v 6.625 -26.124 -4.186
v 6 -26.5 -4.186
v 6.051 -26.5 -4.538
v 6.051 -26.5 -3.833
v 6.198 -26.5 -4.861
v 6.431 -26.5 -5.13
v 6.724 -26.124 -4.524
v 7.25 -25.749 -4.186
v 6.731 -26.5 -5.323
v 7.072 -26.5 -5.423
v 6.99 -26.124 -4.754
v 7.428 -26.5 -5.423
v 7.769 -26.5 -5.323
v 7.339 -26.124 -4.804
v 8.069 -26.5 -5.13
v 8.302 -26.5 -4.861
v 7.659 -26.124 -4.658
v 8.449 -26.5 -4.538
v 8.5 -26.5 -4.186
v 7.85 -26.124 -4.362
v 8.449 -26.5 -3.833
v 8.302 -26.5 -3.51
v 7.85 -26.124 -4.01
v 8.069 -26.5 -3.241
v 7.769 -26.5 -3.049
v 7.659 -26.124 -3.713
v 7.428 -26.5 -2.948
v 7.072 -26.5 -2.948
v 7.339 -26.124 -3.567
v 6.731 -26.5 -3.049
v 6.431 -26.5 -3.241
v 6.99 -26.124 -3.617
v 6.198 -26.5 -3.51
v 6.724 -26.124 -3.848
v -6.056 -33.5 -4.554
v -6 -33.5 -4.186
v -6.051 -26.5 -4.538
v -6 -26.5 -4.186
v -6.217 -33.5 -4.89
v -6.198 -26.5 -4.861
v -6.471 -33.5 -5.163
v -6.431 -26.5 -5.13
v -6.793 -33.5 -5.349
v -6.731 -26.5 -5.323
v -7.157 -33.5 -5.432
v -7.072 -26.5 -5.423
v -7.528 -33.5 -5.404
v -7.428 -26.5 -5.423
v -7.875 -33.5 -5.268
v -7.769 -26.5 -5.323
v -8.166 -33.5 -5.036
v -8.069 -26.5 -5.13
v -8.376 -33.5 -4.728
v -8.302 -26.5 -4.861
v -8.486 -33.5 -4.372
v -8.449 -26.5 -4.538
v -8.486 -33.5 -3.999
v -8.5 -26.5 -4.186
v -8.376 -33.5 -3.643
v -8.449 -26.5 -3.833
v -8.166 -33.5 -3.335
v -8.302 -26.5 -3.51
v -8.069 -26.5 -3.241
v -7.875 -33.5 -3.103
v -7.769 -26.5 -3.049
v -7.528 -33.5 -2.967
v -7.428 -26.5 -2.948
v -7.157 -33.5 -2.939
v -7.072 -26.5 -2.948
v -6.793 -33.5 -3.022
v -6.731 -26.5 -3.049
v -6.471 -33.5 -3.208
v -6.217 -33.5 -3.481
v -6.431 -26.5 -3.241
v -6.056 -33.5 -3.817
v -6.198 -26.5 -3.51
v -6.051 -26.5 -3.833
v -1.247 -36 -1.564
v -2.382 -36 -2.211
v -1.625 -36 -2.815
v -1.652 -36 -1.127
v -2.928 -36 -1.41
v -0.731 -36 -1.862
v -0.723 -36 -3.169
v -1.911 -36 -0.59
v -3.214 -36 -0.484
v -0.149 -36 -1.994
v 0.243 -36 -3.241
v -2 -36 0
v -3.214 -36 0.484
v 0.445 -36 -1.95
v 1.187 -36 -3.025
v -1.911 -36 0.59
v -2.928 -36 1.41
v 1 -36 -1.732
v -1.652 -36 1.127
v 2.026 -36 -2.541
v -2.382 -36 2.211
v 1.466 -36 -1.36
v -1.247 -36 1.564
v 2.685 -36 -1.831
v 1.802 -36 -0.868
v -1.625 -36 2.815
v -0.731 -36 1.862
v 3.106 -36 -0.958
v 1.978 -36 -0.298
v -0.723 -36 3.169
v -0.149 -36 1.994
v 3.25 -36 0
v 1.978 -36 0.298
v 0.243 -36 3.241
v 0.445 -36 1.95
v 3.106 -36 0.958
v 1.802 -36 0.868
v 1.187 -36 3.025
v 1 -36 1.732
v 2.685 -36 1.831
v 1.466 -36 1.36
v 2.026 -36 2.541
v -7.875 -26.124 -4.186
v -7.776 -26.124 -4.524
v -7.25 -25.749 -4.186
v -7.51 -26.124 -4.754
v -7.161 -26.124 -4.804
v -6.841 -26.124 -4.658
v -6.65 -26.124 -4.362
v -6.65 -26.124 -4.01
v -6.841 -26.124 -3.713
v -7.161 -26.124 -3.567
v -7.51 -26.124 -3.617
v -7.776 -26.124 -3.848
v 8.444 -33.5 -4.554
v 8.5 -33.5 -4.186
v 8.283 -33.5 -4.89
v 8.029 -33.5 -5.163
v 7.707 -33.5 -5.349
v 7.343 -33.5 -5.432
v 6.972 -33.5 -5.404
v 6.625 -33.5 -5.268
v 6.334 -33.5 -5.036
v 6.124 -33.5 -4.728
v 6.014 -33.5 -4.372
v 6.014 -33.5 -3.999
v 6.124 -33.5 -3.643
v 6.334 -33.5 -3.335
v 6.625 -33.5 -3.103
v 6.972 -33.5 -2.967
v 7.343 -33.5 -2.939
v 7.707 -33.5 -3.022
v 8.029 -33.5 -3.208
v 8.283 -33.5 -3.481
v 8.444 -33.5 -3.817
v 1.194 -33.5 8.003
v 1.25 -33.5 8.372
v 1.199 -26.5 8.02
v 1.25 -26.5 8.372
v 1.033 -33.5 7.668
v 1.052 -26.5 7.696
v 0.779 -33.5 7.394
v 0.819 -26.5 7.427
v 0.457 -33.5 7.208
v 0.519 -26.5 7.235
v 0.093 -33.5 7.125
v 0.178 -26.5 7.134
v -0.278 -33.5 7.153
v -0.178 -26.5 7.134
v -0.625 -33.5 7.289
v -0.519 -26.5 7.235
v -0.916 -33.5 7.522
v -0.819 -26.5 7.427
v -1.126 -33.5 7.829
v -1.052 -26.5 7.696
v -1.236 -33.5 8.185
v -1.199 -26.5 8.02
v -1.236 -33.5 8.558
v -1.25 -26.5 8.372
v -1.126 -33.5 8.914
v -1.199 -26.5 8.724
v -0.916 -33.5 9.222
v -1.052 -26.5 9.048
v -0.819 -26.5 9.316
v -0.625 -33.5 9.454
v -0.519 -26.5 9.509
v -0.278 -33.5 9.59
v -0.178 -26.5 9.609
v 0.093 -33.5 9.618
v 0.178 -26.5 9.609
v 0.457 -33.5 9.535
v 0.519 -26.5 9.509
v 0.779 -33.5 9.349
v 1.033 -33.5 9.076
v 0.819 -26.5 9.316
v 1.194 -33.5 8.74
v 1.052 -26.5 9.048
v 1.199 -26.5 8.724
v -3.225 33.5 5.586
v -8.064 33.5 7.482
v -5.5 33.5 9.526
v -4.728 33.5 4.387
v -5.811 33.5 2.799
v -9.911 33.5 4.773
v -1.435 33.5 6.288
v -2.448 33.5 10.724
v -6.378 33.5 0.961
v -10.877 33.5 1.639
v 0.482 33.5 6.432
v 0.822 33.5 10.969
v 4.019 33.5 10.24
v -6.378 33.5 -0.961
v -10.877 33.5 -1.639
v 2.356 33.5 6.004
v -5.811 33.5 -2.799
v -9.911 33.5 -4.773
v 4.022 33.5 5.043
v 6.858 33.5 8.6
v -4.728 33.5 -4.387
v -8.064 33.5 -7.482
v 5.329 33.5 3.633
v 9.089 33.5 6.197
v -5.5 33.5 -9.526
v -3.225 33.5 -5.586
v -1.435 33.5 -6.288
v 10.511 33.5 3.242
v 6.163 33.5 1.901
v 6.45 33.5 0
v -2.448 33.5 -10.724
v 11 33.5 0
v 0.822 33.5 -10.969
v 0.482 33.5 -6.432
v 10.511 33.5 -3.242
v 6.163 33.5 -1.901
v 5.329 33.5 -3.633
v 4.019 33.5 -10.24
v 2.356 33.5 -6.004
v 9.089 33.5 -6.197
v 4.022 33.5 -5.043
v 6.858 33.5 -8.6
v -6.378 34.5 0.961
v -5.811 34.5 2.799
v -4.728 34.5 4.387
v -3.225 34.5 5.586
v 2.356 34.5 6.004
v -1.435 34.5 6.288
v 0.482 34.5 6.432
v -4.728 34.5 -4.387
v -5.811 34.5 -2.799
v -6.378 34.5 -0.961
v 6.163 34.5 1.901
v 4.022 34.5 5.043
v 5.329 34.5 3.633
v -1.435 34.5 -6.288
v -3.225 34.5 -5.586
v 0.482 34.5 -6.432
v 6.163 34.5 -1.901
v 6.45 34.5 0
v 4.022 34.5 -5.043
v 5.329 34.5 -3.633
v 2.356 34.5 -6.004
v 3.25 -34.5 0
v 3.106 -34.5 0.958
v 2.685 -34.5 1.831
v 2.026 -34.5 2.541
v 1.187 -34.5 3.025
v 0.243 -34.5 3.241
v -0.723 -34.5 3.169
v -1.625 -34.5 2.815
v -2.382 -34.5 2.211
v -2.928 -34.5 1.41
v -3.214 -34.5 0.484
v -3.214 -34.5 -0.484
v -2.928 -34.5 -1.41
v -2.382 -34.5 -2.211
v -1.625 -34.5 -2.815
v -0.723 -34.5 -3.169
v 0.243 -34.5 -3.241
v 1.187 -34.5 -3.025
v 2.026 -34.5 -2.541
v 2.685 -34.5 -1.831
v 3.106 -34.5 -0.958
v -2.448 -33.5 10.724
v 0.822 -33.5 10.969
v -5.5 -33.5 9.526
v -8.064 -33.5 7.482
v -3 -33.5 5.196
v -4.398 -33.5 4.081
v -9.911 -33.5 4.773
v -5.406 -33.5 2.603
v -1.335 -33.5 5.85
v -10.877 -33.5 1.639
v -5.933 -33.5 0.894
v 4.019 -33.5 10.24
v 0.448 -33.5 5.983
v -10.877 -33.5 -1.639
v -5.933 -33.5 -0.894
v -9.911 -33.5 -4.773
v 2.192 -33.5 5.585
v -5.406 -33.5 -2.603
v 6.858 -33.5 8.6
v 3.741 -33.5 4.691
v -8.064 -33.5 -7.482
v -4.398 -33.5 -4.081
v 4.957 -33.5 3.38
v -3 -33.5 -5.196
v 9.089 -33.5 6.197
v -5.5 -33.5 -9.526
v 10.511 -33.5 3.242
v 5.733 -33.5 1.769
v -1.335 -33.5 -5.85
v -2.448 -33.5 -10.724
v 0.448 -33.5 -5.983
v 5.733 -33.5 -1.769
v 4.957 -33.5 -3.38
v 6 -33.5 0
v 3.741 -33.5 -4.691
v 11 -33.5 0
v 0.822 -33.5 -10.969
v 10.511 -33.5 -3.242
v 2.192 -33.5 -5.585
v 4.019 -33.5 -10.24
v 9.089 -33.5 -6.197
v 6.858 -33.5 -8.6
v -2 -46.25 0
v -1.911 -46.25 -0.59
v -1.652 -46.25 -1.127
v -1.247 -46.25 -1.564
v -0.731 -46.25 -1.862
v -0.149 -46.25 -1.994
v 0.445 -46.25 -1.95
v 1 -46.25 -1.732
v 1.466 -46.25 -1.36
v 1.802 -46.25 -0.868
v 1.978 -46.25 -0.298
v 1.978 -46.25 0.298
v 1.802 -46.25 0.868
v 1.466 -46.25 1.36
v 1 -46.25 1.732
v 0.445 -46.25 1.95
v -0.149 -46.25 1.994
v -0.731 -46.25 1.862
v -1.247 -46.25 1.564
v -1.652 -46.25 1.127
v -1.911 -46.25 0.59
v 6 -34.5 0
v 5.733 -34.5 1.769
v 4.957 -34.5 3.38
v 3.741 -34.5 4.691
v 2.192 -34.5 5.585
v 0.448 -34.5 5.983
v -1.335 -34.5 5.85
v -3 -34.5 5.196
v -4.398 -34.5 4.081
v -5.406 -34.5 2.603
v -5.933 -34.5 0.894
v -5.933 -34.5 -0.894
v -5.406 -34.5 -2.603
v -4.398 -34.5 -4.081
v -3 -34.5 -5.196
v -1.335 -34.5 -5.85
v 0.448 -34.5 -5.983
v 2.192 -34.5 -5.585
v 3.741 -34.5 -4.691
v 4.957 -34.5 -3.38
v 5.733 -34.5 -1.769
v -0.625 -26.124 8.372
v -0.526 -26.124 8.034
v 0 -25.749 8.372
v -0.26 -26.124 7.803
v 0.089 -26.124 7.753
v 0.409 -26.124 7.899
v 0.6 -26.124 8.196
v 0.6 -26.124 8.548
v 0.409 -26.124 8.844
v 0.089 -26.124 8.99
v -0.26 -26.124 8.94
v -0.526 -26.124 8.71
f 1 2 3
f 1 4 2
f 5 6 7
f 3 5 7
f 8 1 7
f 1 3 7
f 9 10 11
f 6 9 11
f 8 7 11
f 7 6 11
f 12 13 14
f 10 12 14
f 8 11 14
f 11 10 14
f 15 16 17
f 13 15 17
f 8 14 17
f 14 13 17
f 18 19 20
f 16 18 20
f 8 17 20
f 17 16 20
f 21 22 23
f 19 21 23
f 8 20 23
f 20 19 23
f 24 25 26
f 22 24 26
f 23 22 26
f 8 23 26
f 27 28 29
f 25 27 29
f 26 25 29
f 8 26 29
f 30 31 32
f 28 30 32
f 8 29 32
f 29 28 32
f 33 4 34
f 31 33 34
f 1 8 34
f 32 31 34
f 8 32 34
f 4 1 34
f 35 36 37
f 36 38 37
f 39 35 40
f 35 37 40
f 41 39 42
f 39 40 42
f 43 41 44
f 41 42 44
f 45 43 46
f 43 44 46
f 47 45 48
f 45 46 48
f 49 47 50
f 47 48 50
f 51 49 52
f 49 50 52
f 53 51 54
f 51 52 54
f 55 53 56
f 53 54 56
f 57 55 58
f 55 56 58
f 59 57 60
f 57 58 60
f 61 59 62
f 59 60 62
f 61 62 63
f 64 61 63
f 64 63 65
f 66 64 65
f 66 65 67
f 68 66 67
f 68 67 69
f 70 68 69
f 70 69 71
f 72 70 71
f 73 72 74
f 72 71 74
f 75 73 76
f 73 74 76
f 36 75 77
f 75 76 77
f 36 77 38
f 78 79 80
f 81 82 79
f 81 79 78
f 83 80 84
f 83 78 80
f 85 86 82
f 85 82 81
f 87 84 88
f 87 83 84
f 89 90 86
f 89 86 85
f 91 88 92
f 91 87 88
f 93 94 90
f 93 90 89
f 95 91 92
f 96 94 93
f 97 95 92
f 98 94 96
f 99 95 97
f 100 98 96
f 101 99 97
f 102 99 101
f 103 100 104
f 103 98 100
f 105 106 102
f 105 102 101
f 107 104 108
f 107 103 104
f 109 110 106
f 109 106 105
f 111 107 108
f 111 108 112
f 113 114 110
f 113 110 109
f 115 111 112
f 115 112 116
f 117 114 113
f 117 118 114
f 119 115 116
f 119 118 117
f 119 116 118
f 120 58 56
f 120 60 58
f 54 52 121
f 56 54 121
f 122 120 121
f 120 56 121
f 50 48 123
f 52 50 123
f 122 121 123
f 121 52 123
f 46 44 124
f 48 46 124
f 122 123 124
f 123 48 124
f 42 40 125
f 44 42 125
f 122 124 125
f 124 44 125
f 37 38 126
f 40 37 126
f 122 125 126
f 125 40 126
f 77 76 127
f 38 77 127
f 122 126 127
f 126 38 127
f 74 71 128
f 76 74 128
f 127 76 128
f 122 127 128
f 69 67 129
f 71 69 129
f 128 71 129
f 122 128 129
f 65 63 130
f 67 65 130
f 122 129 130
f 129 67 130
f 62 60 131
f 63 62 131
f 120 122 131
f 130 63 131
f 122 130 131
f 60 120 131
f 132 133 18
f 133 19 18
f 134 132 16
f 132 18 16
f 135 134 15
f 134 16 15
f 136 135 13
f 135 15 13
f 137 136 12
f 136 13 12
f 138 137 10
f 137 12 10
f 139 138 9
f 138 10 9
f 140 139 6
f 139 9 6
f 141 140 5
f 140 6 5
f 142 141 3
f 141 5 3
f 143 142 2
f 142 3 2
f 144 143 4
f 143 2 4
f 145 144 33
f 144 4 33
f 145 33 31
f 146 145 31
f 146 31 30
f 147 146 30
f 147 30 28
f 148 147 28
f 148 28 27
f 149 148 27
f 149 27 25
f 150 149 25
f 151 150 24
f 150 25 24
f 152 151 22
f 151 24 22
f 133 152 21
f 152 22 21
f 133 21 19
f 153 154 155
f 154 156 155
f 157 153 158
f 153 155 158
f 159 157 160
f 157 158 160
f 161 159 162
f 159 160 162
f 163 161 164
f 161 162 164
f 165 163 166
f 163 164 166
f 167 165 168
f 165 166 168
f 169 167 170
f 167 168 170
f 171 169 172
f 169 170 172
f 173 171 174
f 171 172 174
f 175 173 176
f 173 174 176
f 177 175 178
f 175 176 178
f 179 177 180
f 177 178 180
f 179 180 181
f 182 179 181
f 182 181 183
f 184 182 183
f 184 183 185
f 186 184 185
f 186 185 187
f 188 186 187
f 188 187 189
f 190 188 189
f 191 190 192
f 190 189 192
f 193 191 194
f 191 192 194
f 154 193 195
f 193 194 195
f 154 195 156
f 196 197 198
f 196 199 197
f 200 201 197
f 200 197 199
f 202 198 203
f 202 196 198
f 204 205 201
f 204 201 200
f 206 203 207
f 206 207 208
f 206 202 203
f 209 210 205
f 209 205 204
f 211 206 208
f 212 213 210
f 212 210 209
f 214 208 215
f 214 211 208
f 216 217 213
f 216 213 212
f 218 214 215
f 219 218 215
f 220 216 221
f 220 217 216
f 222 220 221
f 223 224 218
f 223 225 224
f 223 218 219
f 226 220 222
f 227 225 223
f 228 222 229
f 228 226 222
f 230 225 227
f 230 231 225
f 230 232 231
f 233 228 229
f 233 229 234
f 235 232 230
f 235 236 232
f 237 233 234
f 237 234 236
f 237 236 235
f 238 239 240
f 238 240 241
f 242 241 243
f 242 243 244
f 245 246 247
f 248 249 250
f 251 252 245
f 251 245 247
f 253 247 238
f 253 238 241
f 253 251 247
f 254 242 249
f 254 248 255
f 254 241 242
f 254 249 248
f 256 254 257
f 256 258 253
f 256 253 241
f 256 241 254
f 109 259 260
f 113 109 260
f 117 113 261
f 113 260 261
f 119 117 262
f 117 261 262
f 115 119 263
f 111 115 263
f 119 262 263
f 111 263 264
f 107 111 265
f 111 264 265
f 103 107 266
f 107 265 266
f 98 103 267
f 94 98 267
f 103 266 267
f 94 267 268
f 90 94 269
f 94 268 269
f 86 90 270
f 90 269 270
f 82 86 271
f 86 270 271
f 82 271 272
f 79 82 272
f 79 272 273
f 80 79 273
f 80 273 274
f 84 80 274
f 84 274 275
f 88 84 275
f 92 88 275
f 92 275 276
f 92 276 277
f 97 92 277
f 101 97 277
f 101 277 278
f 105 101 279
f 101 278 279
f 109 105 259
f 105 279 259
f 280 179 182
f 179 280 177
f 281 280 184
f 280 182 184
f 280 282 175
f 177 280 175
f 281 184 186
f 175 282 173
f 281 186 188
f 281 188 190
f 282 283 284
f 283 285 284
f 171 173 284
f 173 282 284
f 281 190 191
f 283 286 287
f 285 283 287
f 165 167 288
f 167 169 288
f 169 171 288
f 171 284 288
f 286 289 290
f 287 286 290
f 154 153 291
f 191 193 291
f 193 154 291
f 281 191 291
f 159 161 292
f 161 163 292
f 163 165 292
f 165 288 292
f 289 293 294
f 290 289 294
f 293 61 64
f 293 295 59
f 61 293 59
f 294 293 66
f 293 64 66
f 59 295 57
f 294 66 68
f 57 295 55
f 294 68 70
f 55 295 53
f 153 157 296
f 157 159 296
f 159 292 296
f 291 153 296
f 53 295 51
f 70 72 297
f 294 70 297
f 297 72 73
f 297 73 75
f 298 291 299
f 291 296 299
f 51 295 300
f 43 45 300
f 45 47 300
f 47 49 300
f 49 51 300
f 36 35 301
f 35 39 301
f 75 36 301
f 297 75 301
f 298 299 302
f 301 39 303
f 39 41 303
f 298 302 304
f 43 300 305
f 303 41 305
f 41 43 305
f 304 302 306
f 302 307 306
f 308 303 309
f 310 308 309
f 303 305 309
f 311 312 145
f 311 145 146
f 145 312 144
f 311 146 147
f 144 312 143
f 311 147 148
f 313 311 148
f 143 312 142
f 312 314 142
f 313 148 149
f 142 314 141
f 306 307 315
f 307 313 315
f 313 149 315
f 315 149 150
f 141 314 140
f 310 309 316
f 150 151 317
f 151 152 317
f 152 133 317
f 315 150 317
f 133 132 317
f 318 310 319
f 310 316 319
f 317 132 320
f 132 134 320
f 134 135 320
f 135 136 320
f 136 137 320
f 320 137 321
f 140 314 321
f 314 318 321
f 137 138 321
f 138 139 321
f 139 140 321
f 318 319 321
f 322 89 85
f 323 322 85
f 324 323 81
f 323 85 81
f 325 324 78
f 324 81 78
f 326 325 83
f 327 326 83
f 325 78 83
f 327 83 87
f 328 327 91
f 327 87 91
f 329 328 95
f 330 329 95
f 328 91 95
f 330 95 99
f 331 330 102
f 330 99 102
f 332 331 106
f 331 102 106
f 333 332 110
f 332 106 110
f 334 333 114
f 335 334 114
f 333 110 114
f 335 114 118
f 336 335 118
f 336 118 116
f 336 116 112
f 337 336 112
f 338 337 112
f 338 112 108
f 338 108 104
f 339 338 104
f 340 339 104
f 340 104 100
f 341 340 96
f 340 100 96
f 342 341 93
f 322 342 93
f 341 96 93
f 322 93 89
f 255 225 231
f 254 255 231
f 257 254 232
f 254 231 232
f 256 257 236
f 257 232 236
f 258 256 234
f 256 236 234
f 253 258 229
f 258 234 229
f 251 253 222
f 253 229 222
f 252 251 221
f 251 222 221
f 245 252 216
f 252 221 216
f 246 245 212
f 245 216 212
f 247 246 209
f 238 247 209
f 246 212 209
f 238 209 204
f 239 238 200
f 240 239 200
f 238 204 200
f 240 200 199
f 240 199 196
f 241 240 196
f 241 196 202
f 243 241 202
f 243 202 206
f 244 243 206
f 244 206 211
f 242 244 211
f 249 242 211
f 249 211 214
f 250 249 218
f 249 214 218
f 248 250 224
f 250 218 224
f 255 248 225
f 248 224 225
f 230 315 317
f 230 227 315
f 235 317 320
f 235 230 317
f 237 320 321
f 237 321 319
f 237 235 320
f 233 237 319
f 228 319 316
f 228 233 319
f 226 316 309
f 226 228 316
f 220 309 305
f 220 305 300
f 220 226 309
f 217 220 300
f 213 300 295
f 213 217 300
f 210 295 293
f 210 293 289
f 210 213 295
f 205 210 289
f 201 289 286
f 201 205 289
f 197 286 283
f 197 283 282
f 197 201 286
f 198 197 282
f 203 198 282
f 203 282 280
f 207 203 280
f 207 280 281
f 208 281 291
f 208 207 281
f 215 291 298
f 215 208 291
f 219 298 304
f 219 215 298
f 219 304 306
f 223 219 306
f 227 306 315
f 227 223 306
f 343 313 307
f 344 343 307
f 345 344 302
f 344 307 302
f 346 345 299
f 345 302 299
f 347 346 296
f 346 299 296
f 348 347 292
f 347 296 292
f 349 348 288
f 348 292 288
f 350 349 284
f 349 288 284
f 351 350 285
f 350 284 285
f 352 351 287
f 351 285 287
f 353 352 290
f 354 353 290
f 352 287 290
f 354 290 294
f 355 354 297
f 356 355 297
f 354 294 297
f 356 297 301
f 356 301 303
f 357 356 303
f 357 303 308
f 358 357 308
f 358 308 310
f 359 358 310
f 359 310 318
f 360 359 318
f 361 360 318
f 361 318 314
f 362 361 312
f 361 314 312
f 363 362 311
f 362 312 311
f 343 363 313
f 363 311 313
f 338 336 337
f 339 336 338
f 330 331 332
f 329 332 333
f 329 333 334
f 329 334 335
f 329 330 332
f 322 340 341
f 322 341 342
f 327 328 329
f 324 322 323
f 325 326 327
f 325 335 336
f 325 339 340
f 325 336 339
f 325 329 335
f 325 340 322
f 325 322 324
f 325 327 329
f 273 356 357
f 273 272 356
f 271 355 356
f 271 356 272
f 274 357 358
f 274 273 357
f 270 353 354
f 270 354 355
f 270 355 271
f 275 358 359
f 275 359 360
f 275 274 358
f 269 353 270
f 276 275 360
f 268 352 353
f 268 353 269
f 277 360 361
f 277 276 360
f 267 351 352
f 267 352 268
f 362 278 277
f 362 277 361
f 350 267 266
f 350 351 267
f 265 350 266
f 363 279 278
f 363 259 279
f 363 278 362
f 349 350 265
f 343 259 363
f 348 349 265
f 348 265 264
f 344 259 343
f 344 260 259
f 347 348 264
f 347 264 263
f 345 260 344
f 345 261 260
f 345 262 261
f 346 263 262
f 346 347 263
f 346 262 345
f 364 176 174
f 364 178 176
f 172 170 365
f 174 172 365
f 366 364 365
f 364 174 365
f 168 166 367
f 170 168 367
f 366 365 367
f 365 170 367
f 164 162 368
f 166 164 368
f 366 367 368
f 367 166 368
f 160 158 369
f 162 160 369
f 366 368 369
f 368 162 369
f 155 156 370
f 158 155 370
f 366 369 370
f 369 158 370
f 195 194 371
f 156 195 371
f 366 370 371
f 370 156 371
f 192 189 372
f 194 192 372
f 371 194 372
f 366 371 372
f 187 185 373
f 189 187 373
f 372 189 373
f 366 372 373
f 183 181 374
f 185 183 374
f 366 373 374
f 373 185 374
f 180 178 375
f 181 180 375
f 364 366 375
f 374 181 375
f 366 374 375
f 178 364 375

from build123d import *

# Parameters (mm, degrees)
SKETCH1_R                 = 11
BOSS_EXTRUDE1_DEPTH       = 33.5
SKETCH2_R                 = 6.45
BOSS_EXTRUDE2_DEPTH       = 1
SKETCH3_R                 = 6
BOSS_EXTRUDE3_DEPTH       = 1
SKETCH4_R                 = 3.25
BOSS_EXTRUDE4_DEPTH       = 1.5
SKETCH5_R                 = 2
BOSS_EXTRUDE5_DEPTH       = 10.25
M3X0_5_TAPPED_HOLE1_D     = 2.5
M3X0_5_TAPPED_HOLE1_DEPTH = 7
M3X0_5_TAPPED_HOLE1_TIP   = 0.751075774


with BuildPart() as part:
    # Sketch1 → Boss-Extrude1 (new body, symmetric)
    with BuildSketch(Plane(origin=(0, 0, 0), x_dir=(1, 0, 0), z_dir=(0, 1, 0))):
        Circle(SKETCH1_R)
    extrude(amount=BOSS_EXTRUDE1_DEPTH, both=True)

    # Sketch2 → Boss-Extrude2 (add)
    with BuildSketch(Plane(origin=(0, 33.5, 0), x_dir=(1, 0, 0), z_dir=(0, 1, 0))):
        Circle(SKETCH2_R)
    extrude(amount=BOSS_EXTRUDE2_DEPTH)

    # Sketch3 → Boss-Extrude3 (add)
    with BuildSketch(Plane.XZ.offset(33.5)):
        Circle(SKETCH3_R)
    extrude(amount=BOSS_EXTRUDE3_DEPTH)

    # Sketch4 → Boss-Extrude4 (add)
    with BuildSketch(Plane.XZ.offset(34.5)):
        Circle(SKETCH4_R)
    extrude(amount=BOSS_EXTRUDE4_DEPTH)

    # Sketch5 → Boss-Extrude5 (add)
    with BuildSketch(Plane(origin=(0, -36, 0), x_dir=(-1, 0, 0), z_dir=(0, -1, 0))):
        Circle(SKETCH5_R)
    extrude(amount=BOSS_EXTRUDE5_DEPTH)

    # M3x0.5 Tapped Hole1
    with Locations(Plane(origin=(0, -33.5, 0), x_dir=(-1, 0, 0), z_dir=(0, -1, 0))):
        with Locations((-7.25, 4.185631643), (7.25, 4.185631643), (0, -8.371736712)):
            Hole(M3X0_5_TAPPED_HOLE1_D / 2, depth=M3X0_5_TAPPED_HOLE1_DEPTH)
            with Locations((0, 0, -(M3X0_5_TAPPED_HOLE1_DEPTH + M3X0_5_TAPPED_HOLE1_TIP / 2))):  # 118° drill point
                Cone(0, M3X0_5_TAPPED_HOLE1_D / 2, M3X0_5_TAPPED_HOLE1_TIP, mode=Mode.SUBTRACT)


solid = part.part
